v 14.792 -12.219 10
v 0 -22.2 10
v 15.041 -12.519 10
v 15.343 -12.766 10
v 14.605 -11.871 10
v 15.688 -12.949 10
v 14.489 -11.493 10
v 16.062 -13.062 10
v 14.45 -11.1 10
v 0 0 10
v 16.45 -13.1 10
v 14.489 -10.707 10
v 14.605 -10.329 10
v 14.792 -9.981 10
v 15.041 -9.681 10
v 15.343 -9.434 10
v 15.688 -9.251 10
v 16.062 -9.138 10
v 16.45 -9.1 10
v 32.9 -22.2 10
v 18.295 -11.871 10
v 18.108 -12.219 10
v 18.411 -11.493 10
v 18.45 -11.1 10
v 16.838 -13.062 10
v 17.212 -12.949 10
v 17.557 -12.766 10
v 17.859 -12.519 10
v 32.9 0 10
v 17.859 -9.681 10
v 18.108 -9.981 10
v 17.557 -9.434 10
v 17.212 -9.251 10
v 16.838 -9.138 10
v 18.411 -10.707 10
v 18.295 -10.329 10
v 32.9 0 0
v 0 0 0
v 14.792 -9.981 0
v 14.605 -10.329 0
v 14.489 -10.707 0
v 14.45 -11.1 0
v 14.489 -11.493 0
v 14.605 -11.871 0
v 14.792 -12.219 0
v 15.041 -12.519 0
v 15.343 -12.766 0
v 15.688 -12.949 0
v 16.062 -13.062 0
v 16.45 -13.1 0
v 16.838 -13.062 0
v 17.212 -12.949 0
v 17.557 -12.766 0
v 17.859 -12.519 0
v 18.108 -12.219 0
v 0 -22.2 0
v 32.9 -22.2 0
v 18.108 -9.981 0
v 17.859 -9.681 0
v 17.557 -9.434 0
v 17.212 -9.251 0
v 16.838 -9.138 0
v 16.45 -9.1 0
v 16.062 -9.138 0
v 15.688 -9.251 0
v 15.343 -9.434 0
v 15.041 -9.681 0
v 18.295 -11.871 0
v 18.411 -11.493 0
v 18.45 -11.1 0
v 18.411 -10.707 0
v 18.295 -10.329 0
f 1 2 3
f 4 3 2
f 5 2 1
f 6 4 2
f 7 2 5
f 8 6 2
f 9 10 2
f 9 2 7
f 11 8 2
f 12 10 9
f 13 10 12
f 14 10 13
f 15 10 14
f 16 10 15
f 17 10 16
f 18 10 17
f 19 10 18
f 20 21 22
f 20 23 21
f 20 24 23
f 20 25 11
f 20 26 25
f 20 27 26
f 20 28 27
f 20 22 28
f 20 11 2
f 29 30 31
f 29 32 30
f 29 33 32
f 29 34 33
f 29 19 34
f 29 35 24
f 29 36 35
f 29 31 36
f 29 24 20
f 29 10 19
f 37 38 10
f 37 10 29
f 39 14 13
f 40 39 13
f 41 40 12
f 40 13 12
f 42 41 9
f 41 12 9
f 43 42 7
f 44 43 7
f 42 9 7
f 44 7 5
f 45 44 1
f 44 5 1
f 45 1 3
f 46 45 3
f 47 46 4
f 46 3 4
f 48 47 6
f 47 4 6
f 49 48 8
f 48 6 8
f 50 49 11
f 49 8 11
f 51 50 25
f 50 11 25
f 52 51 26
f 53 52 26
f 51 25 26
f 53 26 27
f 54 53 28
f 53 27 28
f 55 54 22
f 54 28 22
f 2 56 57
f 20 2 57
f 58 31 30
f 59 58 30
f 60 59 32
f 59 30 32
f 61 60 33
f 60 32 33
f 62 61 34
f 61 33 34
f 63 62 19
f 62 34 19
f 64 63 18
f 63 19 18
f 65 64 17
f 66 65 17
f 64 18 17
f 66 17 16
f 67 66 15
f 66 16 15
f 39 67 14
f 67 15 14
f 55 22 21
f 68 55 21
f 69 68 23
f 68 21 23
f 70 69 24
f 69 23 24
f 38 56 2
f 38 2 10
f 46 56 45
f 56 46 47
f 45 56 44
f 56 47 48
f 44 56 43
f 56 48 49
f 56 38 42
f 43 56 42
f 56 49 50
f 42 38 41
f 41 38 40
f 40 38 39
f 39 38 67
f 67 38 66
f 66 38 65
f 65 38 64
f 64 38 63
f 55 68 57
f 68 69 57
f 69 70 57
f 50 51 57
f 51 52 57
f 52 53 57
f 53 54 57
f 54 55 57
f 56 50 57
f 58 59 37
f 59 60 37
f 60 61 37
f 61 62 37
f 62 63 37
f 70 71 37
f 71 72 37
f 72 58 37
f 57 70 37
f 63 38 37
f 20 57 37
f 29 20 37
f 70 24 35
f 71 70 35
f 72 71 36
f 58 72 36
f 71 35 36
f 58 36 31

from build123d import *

# Parameters (mm, degrees)
F0_W     = 32.9
F0_H     = 22.2
F1_DEPTH = 10
F3_DEPTH = 25


with BuildPart() as f1:
    # F0 (on Top) → F1 (new body)
    with BuildSketch(Plane.XY):
        with Locations((16.45, -11.1)):
            Rectangle(F0_W, F0_H)
    extrude(amount=F1_DEPTH)

    # F2 (on face) → F3 (cut)
    with BuildSketch(Plane.XY.offset(10)):
        with BuildLine():
            Line((16.45, -11.1), (14.792127417, -9.981313941))
            ThreePointArc((14.792127417, -9.981313941), (14.45, -11.1), (14.792127417, -12.218686059))
            Line((14.792127417, -12.218686059), (16.45, -11.1))
        make_face()
        with BuildLine():
            ThreePointArc((18.107872583, -9.981313941), (16.45, -9.1), (14.792127417, -9.981313941))
            Line((14.792127417, -9.981313941), (16.45, -11.1))
            Line((16.45, -11.1), (18.107872583, -9.981313941))
        make_face()
        with BuildLine():
            Line((18.107872583, -12.218686059), (16.45, -11.1))
            Line((16.45, -11.1), (14.792127417, -12.218686059))
            ThreePointArc((14.792127417, -12.218686059), (16.45, -13.1), (18.107872583, -12.218686059))
        make_face()
        with BuildLine():
            Line((18.107872583, -9.981313941), (16.45, -11.1))
            Line((16.45, -11.1), (18.107872583, -12.218686059))
            ThreePointArc((18.107872583, -12.218686059), (18.3625565568, -11.6849165898), (18.45, -11.1))
            ThreePointArc((18.45, -11.1), (18.3625565568, -10.5150834102), (18.107872583, -9.981313941))
        make_face()
    extrude(amount=-F3_DEPTH, mode=Mode.SUBTRACT)


solid = f1.part
